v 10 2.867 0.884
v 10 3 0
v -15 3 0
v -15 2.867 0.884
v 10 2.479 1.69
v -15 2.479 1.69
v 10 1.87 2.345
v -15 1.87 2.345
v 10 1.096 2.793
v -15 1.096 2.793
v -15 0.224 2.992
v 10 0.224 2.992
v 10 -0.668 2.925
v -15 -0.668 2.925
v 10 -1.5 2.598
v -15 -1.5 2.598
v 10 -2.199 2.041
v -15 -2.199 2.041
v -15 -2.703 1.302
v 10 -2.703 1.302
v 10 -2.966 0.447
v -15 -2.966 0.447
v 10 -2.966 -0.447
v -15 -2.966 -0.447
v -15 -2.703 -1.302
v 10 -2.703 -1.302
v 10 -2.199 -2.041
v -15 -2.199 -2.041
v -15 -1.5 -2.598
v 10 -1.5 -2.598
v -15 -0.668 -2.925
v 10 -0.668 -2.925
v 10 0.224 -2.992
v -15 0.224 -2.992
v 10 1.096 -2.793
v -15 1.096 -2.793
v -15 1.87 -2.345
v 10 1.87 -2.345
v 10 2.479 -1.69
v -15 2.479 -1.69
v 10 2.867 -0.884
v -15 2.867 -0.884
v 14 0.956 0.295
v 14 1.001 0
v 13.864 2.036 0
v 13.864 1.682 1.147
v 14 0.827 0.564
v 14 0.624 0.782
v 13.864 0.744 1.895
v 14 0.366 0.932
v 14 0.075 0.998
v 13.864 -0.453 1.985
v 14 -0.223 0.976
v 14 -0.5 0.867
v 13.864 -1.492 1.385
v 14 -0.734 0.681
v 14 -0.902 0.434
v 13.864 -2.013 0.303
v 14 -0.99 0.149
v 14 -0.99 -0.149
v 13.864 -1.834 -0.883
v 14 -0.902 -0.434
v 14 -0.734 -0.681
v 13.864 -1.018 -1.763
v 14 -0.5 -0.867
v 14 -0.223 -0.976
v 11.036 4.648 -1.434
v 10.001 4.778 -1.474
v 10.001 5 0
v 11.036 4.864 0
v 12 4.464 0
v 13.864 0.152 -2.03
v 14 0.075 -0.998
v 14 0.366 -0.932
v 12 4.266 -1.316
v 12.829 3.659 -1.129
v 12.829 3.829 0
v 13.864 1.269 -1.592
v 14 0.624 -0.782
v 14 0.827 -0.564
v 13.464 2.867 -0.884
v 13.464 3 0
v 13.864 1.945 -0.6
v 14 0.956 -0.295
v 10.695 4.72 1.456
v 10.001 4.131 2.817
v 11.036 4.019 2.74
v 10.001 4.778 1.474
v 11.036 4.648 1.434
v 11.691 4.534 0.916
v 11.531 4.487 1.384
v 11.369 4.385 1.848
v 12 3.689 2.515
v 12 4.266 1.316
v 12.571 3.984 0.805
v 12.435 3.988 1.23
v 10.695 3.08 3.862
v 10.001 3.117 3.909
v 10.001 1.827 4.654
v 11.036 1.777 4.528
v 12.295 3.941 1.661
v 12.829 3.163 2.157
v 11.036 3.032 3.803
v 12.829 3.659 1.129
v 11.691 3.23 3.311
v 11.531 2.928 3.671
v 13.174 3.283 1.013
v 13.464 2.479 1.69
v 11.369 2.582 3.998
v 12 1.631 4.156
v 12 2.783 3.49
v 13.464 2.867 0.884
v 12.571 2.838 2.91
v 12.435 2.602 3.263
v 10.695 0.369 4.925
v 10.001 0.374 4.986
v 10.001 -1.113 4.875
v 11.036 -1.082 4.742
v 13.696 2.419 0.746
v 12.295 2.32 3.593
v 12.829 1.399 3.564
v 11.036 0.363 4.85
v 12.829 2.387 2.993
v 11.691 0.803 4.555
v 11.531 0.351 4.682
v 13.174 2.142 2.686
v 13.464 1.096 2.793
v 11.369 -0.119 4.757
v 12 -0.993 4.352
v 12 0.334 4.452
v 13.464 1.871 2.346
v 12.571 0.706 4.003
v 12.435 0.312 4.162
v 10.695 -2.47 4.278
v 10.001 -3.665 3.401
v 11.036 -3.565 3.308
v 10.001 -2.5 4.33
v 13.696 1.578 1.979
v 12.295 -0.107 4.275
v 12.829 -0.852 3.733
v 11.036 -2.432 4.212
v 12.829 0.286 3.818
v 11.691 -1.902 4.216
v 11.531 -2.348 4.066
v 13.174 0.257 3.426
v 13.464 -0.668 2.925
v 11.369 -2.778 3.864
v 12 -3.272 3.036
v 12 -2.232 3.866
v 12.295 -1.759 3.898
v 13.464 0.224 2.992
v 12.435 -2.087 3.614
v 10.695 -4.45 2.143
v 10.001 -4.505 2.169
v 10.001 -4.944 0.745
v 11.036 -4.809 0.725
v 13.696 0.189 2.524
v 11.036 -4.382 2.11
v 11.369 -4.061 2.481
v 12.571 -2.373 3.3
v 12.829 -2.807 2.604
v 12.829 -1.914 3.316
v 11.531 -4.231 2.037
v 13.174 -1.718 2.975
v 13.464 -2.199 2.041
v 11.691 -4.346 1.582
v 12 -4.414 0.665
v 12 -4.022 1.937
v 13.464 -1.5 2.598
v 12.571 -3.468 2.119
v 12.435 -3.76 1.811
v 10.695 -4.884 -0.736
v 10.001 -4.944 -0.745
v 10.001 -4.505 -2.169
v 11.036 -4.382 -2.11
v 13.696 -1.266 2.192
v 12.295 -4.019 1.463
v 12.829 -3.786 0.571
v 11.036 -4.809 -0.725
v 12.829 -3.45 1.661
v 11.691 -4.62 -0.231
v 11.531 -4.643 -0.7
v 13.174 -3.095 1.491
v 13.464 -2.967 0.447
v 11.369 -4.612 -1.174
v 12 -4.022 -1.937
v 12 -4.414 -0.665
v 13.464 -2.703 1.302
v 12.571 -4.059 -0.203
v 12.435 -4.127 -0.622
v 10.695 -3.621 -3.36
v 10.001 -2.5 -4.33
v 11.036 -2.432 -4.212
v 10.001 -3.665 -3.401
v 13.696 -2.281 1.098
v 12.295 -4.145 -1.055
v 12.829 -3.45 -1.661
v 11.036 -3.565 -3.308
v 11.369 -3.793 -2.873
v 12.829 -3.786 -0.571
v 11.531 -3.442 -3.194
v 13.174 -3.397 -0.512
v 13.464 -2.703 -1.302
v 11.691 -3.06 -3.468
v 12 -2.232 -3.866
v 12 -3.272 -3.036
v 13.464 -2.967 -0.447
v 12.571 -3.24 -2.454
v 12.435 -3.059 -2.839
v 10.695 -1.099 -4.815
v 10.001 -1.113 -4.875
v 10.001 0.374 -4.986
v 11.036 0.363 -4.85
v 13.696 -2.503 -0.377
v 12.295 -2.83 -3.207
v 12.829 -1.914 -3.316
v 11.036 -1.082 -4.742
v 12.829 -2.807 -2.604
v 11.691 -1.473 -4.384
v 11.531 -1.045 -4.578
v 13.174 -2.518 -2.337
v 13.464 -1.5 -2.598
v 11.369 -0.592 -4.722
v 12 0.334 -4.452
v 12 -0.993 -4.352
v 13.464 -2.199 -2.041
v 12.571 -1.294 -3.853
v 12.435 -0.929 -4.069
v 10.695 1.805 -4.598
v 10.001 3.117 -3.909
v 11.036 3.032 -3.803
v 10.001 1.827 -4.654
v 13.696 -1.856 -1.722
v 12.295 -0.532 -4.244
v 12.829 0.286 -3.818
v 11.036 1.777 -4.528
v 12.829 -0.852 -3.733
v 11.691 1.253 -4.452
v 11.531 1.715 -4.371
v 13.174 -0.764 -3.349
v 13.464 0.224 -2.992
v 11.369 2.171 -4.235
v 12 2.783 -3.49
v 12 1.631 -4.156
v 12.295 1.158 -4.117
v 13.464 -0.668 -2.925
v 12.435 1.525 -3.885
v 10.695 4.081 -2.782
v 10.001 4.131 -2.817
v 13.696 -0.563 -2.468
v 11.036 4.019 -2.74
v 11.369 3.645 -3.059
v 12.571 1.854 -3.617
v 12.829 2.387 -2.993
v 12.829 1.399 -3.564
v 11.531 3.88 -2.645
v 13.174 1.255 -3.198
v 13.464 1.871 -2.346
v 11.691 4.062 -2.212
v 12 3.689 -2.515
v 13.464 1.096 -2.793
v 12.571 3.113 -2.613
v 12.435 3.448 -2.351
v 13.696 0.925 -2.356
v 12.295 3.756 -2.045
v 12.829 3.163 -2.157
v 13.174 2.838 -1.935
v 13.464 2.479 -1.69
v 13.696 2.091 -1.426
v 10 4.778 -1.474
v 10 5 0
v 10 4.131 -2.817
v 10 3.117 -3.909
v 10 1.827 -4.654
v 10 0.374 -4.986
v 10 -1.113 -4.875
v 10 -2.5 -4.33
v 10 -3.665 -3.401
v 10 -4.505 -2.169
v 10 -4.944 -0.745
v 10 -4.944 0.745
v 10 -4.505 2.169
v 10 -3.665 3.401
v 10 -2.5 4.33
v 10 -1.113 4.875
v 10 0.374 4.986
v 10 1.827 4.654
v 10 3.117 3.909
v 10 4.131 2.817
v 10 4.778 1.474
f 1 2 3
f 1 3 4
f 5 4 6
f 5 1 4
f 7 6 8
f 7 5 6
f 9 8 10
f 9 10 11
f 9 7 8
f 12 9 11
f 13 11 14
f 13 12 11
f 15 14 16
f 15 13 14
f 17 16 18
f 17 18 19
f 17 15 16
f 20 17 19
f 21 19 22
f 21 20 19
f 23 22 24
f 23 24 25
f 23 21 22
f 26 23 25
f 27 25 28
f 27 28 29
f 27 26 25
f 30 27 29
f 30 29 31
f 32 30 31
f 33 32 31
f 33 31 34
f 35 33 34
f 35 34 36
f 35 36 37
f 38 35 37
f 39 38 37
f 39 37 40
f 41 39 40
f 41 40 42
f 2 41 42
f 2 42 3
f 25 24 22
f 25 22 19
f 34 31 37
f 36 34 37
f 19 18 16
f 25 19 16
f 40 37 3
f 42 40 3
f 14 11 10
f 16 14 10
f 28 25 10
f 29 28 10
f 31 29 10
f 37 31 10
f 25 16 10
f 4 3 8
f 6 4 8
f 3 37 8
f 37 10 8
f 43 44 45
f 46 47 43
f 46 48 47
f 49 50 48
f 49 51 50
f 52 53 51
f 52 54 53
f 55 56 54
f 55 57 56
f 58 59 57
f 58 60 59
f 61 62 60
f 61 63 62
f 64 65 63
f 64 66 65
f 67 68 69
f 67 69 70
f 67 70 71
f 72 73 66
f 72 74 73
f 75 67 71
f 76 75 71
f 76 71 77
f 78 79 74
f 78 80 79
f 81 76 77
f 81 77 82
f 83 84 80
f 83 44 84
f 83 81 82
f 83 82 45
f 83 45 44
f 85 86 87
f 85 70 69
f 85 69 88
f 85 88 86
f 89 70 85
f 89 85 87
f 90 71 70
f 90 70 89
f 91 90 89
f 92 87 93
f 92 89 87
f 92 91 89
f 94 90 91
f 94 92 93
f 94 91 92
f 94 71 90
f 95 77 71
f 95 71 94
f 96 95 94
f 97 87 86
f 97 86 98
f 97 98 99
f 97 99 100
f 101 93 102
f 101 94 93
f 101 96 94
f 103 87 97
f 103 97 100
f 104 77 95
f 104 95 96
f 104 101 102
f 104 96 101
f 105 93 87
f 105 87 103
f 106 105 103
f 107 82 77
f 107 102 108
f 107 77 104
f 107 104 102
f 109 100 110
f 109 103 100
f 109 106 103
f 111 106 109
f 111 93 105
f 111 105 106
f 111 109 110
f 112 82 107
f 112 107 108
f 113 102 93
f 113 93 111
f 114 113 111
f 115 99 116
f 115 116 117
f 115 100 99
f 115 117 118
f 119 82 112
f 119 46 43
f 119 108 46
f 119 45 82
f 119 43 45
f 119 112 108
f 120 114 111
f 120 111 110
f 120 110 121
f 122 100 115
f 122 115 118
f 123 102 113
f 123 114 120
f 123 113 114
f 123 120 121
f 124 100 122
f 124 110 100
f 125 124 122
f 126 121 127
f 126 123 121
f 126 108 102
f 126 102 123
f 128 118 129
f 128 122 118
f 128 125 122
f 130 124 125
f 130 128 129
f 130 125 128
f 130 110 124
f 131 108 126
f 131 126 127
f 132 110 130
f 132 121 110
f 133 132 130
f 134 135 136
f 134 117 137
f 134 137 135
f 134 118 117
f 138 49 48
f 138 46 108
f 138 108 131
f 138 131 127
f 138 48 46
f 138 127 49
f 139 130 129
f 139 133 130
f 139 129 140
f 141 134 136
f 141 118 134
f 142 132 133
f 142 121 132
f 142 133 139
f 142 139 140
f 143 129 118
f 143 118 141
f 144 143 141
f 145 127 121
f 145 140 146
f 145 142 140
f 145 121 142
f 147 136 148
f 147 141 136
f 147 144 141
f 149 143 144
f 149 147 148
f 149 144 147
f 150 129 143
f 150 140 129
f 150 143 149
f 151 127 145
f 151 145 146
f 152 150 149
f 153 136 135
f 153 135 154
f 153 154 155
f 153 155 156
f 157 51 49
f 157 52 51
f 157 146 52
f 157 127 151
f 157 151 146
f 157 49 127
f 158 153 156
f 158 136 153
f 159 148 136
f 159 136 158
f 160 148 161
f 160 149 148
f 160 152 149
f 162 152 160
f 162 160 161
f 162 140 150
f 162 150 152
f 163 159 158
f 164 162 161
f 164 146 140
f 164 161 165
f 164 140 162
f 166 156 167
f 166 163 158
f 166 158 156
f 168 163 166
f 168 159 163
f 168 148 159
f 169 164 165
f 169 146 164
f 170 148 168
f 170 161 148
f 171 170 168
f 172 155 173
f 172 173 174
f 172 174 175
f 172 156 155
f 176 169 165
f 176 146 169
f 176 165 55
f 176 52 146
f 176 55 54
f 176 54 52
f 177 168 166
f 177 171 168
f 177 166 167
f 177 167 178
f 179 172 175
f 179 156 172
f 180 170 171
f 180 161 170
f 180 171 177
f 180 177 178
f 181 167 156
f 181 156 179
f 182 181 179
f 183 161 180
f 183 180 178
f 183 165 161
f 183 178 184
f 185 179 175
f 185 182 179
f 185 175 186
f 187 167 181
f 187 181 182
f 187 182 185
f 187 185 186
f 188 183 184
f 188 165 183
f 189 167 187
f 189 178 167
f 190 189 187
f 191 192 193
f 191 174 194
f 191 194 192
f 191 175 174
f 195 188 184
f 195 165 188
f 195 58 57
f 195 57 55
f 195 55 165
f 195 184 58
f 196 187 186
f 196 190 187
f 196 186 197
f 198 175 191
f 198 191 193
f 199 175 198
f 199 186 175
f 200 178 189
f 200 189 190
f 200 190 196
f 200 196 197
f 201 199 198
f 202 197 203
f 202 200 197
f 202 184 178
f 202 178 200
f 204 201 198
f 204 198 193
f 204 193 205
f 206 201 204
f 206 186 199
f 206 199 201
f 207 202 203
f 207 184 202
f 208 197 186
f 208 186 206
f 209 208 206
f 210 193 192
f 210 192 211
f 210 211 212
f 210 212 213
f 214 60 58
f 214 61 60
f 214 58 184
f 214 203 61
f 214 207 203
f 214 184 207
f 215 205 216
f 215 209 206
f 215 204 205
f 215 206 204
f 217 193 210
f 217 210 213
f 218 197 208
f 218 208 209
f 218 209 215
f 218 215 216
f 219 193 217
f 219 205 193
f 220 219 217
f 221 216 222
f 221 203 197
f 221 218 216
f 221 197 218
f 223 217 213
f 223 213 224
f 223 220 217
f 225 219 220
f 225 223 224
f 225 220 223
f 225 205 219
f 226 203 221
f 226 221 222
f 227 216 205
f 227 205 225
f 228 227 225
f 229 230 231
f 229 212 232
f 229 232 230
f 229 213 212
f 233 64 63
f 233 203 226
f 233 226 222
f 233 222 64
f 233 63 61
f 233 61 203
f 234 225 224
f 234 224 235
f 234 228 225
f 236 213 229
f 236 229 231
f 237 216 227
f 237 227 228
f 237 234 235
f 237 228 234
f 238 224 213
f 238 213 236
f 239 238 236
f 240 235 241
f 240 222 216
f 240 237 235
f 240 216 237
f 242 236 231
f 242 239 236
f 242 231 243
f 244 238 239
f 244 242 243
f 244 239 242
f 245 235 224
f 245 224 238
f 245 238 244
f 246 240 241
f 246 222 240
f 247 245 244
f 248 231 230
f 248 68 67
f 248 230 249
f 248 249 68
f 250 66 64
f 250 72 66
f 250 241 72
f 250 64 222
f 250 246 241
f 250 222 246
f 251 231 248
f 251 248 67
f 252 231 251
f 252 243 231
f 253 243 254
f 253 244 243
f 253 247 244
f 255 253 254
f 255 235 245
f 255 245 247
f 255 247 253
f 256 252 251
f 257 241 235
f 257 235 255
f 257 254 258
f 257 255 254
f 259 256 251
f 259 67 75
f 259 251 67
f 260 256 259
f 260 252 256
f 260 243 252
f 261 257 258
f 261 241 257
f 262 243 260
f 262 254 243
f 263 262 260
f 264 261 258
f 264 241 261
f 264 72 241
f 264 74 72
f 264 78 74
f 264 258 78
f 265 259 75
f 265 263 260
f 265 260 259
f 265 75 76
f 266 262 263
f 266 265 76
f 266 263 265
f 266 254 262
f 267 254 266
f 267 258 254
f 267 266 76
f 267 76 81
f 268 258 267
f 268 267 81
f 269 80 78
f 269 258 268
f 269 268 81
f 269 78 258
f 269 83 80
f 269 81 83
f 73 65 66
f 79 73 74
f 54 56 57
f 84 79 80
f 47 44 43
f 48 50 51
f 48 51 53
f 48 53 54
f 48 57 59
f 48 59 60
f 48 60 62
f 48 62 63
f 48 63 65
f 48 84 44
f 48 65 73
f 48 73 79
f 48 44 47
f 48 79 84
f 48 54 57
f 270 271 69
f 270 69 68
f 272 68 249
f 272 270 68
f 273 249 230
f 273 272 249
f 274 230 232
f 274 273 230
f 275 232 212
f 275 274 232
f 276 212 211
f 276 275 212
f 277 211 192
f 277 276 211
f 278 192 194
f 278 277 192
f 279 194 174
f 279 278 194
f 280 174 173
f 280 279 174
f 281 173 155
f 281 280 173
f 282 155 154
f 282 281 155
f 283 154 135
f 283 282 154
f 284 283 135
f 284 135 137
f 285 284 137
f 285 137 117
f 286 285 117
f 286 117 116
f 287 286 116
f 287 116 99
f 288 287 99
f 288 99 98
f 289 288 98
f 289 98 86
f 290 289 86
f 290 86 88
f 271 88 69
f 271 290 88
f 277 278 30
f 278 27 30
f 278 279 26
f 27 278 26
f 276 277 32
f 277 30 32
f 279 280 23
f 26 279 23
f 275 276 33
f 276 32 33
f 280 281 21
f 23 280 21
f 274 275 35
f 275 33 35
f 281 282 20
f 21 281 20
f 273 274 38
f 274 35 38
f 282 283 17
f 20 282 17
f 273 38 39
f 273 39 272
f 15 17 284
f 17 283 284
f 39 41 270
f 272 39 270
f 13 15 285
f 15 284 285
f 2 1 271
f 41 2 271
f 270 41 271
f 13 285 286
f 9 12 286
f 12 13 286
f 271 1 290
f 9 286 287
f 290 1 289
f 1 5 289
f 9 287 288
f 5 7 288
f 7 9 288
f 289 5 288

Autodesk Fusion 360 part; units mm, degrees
sketch "Sketch1" plane through (0, 0, 0) normal (1, 0, 0) x (0, 1, 0)
  circle A0 centre (0, 0) radius 3
  dimension "d1" = 6
extrude "Extrude1" add sketch "Sketch1" against normal blind 15
extrude "Extrude2" add 1 faces at (0, -1.1591, 0.5829) along direction (1, 0, 0) blind 10
sketch "Sketch2" plane through (10, 0, 0) normal (1, 0, 0) x (0, 1, 0)
  circle A0 centre (0, 0) radius 3
  circle A1 centre (0, 0) radius 5
  dimension "d7" = 10
extrude "Extrude3" add sketch "Sketch2" along normal blind 4 contours A0 | A1
fillet "Fillet1" radius 4 1 edges at (14, -4.6616, -1.8081)
thread "Thread1"
